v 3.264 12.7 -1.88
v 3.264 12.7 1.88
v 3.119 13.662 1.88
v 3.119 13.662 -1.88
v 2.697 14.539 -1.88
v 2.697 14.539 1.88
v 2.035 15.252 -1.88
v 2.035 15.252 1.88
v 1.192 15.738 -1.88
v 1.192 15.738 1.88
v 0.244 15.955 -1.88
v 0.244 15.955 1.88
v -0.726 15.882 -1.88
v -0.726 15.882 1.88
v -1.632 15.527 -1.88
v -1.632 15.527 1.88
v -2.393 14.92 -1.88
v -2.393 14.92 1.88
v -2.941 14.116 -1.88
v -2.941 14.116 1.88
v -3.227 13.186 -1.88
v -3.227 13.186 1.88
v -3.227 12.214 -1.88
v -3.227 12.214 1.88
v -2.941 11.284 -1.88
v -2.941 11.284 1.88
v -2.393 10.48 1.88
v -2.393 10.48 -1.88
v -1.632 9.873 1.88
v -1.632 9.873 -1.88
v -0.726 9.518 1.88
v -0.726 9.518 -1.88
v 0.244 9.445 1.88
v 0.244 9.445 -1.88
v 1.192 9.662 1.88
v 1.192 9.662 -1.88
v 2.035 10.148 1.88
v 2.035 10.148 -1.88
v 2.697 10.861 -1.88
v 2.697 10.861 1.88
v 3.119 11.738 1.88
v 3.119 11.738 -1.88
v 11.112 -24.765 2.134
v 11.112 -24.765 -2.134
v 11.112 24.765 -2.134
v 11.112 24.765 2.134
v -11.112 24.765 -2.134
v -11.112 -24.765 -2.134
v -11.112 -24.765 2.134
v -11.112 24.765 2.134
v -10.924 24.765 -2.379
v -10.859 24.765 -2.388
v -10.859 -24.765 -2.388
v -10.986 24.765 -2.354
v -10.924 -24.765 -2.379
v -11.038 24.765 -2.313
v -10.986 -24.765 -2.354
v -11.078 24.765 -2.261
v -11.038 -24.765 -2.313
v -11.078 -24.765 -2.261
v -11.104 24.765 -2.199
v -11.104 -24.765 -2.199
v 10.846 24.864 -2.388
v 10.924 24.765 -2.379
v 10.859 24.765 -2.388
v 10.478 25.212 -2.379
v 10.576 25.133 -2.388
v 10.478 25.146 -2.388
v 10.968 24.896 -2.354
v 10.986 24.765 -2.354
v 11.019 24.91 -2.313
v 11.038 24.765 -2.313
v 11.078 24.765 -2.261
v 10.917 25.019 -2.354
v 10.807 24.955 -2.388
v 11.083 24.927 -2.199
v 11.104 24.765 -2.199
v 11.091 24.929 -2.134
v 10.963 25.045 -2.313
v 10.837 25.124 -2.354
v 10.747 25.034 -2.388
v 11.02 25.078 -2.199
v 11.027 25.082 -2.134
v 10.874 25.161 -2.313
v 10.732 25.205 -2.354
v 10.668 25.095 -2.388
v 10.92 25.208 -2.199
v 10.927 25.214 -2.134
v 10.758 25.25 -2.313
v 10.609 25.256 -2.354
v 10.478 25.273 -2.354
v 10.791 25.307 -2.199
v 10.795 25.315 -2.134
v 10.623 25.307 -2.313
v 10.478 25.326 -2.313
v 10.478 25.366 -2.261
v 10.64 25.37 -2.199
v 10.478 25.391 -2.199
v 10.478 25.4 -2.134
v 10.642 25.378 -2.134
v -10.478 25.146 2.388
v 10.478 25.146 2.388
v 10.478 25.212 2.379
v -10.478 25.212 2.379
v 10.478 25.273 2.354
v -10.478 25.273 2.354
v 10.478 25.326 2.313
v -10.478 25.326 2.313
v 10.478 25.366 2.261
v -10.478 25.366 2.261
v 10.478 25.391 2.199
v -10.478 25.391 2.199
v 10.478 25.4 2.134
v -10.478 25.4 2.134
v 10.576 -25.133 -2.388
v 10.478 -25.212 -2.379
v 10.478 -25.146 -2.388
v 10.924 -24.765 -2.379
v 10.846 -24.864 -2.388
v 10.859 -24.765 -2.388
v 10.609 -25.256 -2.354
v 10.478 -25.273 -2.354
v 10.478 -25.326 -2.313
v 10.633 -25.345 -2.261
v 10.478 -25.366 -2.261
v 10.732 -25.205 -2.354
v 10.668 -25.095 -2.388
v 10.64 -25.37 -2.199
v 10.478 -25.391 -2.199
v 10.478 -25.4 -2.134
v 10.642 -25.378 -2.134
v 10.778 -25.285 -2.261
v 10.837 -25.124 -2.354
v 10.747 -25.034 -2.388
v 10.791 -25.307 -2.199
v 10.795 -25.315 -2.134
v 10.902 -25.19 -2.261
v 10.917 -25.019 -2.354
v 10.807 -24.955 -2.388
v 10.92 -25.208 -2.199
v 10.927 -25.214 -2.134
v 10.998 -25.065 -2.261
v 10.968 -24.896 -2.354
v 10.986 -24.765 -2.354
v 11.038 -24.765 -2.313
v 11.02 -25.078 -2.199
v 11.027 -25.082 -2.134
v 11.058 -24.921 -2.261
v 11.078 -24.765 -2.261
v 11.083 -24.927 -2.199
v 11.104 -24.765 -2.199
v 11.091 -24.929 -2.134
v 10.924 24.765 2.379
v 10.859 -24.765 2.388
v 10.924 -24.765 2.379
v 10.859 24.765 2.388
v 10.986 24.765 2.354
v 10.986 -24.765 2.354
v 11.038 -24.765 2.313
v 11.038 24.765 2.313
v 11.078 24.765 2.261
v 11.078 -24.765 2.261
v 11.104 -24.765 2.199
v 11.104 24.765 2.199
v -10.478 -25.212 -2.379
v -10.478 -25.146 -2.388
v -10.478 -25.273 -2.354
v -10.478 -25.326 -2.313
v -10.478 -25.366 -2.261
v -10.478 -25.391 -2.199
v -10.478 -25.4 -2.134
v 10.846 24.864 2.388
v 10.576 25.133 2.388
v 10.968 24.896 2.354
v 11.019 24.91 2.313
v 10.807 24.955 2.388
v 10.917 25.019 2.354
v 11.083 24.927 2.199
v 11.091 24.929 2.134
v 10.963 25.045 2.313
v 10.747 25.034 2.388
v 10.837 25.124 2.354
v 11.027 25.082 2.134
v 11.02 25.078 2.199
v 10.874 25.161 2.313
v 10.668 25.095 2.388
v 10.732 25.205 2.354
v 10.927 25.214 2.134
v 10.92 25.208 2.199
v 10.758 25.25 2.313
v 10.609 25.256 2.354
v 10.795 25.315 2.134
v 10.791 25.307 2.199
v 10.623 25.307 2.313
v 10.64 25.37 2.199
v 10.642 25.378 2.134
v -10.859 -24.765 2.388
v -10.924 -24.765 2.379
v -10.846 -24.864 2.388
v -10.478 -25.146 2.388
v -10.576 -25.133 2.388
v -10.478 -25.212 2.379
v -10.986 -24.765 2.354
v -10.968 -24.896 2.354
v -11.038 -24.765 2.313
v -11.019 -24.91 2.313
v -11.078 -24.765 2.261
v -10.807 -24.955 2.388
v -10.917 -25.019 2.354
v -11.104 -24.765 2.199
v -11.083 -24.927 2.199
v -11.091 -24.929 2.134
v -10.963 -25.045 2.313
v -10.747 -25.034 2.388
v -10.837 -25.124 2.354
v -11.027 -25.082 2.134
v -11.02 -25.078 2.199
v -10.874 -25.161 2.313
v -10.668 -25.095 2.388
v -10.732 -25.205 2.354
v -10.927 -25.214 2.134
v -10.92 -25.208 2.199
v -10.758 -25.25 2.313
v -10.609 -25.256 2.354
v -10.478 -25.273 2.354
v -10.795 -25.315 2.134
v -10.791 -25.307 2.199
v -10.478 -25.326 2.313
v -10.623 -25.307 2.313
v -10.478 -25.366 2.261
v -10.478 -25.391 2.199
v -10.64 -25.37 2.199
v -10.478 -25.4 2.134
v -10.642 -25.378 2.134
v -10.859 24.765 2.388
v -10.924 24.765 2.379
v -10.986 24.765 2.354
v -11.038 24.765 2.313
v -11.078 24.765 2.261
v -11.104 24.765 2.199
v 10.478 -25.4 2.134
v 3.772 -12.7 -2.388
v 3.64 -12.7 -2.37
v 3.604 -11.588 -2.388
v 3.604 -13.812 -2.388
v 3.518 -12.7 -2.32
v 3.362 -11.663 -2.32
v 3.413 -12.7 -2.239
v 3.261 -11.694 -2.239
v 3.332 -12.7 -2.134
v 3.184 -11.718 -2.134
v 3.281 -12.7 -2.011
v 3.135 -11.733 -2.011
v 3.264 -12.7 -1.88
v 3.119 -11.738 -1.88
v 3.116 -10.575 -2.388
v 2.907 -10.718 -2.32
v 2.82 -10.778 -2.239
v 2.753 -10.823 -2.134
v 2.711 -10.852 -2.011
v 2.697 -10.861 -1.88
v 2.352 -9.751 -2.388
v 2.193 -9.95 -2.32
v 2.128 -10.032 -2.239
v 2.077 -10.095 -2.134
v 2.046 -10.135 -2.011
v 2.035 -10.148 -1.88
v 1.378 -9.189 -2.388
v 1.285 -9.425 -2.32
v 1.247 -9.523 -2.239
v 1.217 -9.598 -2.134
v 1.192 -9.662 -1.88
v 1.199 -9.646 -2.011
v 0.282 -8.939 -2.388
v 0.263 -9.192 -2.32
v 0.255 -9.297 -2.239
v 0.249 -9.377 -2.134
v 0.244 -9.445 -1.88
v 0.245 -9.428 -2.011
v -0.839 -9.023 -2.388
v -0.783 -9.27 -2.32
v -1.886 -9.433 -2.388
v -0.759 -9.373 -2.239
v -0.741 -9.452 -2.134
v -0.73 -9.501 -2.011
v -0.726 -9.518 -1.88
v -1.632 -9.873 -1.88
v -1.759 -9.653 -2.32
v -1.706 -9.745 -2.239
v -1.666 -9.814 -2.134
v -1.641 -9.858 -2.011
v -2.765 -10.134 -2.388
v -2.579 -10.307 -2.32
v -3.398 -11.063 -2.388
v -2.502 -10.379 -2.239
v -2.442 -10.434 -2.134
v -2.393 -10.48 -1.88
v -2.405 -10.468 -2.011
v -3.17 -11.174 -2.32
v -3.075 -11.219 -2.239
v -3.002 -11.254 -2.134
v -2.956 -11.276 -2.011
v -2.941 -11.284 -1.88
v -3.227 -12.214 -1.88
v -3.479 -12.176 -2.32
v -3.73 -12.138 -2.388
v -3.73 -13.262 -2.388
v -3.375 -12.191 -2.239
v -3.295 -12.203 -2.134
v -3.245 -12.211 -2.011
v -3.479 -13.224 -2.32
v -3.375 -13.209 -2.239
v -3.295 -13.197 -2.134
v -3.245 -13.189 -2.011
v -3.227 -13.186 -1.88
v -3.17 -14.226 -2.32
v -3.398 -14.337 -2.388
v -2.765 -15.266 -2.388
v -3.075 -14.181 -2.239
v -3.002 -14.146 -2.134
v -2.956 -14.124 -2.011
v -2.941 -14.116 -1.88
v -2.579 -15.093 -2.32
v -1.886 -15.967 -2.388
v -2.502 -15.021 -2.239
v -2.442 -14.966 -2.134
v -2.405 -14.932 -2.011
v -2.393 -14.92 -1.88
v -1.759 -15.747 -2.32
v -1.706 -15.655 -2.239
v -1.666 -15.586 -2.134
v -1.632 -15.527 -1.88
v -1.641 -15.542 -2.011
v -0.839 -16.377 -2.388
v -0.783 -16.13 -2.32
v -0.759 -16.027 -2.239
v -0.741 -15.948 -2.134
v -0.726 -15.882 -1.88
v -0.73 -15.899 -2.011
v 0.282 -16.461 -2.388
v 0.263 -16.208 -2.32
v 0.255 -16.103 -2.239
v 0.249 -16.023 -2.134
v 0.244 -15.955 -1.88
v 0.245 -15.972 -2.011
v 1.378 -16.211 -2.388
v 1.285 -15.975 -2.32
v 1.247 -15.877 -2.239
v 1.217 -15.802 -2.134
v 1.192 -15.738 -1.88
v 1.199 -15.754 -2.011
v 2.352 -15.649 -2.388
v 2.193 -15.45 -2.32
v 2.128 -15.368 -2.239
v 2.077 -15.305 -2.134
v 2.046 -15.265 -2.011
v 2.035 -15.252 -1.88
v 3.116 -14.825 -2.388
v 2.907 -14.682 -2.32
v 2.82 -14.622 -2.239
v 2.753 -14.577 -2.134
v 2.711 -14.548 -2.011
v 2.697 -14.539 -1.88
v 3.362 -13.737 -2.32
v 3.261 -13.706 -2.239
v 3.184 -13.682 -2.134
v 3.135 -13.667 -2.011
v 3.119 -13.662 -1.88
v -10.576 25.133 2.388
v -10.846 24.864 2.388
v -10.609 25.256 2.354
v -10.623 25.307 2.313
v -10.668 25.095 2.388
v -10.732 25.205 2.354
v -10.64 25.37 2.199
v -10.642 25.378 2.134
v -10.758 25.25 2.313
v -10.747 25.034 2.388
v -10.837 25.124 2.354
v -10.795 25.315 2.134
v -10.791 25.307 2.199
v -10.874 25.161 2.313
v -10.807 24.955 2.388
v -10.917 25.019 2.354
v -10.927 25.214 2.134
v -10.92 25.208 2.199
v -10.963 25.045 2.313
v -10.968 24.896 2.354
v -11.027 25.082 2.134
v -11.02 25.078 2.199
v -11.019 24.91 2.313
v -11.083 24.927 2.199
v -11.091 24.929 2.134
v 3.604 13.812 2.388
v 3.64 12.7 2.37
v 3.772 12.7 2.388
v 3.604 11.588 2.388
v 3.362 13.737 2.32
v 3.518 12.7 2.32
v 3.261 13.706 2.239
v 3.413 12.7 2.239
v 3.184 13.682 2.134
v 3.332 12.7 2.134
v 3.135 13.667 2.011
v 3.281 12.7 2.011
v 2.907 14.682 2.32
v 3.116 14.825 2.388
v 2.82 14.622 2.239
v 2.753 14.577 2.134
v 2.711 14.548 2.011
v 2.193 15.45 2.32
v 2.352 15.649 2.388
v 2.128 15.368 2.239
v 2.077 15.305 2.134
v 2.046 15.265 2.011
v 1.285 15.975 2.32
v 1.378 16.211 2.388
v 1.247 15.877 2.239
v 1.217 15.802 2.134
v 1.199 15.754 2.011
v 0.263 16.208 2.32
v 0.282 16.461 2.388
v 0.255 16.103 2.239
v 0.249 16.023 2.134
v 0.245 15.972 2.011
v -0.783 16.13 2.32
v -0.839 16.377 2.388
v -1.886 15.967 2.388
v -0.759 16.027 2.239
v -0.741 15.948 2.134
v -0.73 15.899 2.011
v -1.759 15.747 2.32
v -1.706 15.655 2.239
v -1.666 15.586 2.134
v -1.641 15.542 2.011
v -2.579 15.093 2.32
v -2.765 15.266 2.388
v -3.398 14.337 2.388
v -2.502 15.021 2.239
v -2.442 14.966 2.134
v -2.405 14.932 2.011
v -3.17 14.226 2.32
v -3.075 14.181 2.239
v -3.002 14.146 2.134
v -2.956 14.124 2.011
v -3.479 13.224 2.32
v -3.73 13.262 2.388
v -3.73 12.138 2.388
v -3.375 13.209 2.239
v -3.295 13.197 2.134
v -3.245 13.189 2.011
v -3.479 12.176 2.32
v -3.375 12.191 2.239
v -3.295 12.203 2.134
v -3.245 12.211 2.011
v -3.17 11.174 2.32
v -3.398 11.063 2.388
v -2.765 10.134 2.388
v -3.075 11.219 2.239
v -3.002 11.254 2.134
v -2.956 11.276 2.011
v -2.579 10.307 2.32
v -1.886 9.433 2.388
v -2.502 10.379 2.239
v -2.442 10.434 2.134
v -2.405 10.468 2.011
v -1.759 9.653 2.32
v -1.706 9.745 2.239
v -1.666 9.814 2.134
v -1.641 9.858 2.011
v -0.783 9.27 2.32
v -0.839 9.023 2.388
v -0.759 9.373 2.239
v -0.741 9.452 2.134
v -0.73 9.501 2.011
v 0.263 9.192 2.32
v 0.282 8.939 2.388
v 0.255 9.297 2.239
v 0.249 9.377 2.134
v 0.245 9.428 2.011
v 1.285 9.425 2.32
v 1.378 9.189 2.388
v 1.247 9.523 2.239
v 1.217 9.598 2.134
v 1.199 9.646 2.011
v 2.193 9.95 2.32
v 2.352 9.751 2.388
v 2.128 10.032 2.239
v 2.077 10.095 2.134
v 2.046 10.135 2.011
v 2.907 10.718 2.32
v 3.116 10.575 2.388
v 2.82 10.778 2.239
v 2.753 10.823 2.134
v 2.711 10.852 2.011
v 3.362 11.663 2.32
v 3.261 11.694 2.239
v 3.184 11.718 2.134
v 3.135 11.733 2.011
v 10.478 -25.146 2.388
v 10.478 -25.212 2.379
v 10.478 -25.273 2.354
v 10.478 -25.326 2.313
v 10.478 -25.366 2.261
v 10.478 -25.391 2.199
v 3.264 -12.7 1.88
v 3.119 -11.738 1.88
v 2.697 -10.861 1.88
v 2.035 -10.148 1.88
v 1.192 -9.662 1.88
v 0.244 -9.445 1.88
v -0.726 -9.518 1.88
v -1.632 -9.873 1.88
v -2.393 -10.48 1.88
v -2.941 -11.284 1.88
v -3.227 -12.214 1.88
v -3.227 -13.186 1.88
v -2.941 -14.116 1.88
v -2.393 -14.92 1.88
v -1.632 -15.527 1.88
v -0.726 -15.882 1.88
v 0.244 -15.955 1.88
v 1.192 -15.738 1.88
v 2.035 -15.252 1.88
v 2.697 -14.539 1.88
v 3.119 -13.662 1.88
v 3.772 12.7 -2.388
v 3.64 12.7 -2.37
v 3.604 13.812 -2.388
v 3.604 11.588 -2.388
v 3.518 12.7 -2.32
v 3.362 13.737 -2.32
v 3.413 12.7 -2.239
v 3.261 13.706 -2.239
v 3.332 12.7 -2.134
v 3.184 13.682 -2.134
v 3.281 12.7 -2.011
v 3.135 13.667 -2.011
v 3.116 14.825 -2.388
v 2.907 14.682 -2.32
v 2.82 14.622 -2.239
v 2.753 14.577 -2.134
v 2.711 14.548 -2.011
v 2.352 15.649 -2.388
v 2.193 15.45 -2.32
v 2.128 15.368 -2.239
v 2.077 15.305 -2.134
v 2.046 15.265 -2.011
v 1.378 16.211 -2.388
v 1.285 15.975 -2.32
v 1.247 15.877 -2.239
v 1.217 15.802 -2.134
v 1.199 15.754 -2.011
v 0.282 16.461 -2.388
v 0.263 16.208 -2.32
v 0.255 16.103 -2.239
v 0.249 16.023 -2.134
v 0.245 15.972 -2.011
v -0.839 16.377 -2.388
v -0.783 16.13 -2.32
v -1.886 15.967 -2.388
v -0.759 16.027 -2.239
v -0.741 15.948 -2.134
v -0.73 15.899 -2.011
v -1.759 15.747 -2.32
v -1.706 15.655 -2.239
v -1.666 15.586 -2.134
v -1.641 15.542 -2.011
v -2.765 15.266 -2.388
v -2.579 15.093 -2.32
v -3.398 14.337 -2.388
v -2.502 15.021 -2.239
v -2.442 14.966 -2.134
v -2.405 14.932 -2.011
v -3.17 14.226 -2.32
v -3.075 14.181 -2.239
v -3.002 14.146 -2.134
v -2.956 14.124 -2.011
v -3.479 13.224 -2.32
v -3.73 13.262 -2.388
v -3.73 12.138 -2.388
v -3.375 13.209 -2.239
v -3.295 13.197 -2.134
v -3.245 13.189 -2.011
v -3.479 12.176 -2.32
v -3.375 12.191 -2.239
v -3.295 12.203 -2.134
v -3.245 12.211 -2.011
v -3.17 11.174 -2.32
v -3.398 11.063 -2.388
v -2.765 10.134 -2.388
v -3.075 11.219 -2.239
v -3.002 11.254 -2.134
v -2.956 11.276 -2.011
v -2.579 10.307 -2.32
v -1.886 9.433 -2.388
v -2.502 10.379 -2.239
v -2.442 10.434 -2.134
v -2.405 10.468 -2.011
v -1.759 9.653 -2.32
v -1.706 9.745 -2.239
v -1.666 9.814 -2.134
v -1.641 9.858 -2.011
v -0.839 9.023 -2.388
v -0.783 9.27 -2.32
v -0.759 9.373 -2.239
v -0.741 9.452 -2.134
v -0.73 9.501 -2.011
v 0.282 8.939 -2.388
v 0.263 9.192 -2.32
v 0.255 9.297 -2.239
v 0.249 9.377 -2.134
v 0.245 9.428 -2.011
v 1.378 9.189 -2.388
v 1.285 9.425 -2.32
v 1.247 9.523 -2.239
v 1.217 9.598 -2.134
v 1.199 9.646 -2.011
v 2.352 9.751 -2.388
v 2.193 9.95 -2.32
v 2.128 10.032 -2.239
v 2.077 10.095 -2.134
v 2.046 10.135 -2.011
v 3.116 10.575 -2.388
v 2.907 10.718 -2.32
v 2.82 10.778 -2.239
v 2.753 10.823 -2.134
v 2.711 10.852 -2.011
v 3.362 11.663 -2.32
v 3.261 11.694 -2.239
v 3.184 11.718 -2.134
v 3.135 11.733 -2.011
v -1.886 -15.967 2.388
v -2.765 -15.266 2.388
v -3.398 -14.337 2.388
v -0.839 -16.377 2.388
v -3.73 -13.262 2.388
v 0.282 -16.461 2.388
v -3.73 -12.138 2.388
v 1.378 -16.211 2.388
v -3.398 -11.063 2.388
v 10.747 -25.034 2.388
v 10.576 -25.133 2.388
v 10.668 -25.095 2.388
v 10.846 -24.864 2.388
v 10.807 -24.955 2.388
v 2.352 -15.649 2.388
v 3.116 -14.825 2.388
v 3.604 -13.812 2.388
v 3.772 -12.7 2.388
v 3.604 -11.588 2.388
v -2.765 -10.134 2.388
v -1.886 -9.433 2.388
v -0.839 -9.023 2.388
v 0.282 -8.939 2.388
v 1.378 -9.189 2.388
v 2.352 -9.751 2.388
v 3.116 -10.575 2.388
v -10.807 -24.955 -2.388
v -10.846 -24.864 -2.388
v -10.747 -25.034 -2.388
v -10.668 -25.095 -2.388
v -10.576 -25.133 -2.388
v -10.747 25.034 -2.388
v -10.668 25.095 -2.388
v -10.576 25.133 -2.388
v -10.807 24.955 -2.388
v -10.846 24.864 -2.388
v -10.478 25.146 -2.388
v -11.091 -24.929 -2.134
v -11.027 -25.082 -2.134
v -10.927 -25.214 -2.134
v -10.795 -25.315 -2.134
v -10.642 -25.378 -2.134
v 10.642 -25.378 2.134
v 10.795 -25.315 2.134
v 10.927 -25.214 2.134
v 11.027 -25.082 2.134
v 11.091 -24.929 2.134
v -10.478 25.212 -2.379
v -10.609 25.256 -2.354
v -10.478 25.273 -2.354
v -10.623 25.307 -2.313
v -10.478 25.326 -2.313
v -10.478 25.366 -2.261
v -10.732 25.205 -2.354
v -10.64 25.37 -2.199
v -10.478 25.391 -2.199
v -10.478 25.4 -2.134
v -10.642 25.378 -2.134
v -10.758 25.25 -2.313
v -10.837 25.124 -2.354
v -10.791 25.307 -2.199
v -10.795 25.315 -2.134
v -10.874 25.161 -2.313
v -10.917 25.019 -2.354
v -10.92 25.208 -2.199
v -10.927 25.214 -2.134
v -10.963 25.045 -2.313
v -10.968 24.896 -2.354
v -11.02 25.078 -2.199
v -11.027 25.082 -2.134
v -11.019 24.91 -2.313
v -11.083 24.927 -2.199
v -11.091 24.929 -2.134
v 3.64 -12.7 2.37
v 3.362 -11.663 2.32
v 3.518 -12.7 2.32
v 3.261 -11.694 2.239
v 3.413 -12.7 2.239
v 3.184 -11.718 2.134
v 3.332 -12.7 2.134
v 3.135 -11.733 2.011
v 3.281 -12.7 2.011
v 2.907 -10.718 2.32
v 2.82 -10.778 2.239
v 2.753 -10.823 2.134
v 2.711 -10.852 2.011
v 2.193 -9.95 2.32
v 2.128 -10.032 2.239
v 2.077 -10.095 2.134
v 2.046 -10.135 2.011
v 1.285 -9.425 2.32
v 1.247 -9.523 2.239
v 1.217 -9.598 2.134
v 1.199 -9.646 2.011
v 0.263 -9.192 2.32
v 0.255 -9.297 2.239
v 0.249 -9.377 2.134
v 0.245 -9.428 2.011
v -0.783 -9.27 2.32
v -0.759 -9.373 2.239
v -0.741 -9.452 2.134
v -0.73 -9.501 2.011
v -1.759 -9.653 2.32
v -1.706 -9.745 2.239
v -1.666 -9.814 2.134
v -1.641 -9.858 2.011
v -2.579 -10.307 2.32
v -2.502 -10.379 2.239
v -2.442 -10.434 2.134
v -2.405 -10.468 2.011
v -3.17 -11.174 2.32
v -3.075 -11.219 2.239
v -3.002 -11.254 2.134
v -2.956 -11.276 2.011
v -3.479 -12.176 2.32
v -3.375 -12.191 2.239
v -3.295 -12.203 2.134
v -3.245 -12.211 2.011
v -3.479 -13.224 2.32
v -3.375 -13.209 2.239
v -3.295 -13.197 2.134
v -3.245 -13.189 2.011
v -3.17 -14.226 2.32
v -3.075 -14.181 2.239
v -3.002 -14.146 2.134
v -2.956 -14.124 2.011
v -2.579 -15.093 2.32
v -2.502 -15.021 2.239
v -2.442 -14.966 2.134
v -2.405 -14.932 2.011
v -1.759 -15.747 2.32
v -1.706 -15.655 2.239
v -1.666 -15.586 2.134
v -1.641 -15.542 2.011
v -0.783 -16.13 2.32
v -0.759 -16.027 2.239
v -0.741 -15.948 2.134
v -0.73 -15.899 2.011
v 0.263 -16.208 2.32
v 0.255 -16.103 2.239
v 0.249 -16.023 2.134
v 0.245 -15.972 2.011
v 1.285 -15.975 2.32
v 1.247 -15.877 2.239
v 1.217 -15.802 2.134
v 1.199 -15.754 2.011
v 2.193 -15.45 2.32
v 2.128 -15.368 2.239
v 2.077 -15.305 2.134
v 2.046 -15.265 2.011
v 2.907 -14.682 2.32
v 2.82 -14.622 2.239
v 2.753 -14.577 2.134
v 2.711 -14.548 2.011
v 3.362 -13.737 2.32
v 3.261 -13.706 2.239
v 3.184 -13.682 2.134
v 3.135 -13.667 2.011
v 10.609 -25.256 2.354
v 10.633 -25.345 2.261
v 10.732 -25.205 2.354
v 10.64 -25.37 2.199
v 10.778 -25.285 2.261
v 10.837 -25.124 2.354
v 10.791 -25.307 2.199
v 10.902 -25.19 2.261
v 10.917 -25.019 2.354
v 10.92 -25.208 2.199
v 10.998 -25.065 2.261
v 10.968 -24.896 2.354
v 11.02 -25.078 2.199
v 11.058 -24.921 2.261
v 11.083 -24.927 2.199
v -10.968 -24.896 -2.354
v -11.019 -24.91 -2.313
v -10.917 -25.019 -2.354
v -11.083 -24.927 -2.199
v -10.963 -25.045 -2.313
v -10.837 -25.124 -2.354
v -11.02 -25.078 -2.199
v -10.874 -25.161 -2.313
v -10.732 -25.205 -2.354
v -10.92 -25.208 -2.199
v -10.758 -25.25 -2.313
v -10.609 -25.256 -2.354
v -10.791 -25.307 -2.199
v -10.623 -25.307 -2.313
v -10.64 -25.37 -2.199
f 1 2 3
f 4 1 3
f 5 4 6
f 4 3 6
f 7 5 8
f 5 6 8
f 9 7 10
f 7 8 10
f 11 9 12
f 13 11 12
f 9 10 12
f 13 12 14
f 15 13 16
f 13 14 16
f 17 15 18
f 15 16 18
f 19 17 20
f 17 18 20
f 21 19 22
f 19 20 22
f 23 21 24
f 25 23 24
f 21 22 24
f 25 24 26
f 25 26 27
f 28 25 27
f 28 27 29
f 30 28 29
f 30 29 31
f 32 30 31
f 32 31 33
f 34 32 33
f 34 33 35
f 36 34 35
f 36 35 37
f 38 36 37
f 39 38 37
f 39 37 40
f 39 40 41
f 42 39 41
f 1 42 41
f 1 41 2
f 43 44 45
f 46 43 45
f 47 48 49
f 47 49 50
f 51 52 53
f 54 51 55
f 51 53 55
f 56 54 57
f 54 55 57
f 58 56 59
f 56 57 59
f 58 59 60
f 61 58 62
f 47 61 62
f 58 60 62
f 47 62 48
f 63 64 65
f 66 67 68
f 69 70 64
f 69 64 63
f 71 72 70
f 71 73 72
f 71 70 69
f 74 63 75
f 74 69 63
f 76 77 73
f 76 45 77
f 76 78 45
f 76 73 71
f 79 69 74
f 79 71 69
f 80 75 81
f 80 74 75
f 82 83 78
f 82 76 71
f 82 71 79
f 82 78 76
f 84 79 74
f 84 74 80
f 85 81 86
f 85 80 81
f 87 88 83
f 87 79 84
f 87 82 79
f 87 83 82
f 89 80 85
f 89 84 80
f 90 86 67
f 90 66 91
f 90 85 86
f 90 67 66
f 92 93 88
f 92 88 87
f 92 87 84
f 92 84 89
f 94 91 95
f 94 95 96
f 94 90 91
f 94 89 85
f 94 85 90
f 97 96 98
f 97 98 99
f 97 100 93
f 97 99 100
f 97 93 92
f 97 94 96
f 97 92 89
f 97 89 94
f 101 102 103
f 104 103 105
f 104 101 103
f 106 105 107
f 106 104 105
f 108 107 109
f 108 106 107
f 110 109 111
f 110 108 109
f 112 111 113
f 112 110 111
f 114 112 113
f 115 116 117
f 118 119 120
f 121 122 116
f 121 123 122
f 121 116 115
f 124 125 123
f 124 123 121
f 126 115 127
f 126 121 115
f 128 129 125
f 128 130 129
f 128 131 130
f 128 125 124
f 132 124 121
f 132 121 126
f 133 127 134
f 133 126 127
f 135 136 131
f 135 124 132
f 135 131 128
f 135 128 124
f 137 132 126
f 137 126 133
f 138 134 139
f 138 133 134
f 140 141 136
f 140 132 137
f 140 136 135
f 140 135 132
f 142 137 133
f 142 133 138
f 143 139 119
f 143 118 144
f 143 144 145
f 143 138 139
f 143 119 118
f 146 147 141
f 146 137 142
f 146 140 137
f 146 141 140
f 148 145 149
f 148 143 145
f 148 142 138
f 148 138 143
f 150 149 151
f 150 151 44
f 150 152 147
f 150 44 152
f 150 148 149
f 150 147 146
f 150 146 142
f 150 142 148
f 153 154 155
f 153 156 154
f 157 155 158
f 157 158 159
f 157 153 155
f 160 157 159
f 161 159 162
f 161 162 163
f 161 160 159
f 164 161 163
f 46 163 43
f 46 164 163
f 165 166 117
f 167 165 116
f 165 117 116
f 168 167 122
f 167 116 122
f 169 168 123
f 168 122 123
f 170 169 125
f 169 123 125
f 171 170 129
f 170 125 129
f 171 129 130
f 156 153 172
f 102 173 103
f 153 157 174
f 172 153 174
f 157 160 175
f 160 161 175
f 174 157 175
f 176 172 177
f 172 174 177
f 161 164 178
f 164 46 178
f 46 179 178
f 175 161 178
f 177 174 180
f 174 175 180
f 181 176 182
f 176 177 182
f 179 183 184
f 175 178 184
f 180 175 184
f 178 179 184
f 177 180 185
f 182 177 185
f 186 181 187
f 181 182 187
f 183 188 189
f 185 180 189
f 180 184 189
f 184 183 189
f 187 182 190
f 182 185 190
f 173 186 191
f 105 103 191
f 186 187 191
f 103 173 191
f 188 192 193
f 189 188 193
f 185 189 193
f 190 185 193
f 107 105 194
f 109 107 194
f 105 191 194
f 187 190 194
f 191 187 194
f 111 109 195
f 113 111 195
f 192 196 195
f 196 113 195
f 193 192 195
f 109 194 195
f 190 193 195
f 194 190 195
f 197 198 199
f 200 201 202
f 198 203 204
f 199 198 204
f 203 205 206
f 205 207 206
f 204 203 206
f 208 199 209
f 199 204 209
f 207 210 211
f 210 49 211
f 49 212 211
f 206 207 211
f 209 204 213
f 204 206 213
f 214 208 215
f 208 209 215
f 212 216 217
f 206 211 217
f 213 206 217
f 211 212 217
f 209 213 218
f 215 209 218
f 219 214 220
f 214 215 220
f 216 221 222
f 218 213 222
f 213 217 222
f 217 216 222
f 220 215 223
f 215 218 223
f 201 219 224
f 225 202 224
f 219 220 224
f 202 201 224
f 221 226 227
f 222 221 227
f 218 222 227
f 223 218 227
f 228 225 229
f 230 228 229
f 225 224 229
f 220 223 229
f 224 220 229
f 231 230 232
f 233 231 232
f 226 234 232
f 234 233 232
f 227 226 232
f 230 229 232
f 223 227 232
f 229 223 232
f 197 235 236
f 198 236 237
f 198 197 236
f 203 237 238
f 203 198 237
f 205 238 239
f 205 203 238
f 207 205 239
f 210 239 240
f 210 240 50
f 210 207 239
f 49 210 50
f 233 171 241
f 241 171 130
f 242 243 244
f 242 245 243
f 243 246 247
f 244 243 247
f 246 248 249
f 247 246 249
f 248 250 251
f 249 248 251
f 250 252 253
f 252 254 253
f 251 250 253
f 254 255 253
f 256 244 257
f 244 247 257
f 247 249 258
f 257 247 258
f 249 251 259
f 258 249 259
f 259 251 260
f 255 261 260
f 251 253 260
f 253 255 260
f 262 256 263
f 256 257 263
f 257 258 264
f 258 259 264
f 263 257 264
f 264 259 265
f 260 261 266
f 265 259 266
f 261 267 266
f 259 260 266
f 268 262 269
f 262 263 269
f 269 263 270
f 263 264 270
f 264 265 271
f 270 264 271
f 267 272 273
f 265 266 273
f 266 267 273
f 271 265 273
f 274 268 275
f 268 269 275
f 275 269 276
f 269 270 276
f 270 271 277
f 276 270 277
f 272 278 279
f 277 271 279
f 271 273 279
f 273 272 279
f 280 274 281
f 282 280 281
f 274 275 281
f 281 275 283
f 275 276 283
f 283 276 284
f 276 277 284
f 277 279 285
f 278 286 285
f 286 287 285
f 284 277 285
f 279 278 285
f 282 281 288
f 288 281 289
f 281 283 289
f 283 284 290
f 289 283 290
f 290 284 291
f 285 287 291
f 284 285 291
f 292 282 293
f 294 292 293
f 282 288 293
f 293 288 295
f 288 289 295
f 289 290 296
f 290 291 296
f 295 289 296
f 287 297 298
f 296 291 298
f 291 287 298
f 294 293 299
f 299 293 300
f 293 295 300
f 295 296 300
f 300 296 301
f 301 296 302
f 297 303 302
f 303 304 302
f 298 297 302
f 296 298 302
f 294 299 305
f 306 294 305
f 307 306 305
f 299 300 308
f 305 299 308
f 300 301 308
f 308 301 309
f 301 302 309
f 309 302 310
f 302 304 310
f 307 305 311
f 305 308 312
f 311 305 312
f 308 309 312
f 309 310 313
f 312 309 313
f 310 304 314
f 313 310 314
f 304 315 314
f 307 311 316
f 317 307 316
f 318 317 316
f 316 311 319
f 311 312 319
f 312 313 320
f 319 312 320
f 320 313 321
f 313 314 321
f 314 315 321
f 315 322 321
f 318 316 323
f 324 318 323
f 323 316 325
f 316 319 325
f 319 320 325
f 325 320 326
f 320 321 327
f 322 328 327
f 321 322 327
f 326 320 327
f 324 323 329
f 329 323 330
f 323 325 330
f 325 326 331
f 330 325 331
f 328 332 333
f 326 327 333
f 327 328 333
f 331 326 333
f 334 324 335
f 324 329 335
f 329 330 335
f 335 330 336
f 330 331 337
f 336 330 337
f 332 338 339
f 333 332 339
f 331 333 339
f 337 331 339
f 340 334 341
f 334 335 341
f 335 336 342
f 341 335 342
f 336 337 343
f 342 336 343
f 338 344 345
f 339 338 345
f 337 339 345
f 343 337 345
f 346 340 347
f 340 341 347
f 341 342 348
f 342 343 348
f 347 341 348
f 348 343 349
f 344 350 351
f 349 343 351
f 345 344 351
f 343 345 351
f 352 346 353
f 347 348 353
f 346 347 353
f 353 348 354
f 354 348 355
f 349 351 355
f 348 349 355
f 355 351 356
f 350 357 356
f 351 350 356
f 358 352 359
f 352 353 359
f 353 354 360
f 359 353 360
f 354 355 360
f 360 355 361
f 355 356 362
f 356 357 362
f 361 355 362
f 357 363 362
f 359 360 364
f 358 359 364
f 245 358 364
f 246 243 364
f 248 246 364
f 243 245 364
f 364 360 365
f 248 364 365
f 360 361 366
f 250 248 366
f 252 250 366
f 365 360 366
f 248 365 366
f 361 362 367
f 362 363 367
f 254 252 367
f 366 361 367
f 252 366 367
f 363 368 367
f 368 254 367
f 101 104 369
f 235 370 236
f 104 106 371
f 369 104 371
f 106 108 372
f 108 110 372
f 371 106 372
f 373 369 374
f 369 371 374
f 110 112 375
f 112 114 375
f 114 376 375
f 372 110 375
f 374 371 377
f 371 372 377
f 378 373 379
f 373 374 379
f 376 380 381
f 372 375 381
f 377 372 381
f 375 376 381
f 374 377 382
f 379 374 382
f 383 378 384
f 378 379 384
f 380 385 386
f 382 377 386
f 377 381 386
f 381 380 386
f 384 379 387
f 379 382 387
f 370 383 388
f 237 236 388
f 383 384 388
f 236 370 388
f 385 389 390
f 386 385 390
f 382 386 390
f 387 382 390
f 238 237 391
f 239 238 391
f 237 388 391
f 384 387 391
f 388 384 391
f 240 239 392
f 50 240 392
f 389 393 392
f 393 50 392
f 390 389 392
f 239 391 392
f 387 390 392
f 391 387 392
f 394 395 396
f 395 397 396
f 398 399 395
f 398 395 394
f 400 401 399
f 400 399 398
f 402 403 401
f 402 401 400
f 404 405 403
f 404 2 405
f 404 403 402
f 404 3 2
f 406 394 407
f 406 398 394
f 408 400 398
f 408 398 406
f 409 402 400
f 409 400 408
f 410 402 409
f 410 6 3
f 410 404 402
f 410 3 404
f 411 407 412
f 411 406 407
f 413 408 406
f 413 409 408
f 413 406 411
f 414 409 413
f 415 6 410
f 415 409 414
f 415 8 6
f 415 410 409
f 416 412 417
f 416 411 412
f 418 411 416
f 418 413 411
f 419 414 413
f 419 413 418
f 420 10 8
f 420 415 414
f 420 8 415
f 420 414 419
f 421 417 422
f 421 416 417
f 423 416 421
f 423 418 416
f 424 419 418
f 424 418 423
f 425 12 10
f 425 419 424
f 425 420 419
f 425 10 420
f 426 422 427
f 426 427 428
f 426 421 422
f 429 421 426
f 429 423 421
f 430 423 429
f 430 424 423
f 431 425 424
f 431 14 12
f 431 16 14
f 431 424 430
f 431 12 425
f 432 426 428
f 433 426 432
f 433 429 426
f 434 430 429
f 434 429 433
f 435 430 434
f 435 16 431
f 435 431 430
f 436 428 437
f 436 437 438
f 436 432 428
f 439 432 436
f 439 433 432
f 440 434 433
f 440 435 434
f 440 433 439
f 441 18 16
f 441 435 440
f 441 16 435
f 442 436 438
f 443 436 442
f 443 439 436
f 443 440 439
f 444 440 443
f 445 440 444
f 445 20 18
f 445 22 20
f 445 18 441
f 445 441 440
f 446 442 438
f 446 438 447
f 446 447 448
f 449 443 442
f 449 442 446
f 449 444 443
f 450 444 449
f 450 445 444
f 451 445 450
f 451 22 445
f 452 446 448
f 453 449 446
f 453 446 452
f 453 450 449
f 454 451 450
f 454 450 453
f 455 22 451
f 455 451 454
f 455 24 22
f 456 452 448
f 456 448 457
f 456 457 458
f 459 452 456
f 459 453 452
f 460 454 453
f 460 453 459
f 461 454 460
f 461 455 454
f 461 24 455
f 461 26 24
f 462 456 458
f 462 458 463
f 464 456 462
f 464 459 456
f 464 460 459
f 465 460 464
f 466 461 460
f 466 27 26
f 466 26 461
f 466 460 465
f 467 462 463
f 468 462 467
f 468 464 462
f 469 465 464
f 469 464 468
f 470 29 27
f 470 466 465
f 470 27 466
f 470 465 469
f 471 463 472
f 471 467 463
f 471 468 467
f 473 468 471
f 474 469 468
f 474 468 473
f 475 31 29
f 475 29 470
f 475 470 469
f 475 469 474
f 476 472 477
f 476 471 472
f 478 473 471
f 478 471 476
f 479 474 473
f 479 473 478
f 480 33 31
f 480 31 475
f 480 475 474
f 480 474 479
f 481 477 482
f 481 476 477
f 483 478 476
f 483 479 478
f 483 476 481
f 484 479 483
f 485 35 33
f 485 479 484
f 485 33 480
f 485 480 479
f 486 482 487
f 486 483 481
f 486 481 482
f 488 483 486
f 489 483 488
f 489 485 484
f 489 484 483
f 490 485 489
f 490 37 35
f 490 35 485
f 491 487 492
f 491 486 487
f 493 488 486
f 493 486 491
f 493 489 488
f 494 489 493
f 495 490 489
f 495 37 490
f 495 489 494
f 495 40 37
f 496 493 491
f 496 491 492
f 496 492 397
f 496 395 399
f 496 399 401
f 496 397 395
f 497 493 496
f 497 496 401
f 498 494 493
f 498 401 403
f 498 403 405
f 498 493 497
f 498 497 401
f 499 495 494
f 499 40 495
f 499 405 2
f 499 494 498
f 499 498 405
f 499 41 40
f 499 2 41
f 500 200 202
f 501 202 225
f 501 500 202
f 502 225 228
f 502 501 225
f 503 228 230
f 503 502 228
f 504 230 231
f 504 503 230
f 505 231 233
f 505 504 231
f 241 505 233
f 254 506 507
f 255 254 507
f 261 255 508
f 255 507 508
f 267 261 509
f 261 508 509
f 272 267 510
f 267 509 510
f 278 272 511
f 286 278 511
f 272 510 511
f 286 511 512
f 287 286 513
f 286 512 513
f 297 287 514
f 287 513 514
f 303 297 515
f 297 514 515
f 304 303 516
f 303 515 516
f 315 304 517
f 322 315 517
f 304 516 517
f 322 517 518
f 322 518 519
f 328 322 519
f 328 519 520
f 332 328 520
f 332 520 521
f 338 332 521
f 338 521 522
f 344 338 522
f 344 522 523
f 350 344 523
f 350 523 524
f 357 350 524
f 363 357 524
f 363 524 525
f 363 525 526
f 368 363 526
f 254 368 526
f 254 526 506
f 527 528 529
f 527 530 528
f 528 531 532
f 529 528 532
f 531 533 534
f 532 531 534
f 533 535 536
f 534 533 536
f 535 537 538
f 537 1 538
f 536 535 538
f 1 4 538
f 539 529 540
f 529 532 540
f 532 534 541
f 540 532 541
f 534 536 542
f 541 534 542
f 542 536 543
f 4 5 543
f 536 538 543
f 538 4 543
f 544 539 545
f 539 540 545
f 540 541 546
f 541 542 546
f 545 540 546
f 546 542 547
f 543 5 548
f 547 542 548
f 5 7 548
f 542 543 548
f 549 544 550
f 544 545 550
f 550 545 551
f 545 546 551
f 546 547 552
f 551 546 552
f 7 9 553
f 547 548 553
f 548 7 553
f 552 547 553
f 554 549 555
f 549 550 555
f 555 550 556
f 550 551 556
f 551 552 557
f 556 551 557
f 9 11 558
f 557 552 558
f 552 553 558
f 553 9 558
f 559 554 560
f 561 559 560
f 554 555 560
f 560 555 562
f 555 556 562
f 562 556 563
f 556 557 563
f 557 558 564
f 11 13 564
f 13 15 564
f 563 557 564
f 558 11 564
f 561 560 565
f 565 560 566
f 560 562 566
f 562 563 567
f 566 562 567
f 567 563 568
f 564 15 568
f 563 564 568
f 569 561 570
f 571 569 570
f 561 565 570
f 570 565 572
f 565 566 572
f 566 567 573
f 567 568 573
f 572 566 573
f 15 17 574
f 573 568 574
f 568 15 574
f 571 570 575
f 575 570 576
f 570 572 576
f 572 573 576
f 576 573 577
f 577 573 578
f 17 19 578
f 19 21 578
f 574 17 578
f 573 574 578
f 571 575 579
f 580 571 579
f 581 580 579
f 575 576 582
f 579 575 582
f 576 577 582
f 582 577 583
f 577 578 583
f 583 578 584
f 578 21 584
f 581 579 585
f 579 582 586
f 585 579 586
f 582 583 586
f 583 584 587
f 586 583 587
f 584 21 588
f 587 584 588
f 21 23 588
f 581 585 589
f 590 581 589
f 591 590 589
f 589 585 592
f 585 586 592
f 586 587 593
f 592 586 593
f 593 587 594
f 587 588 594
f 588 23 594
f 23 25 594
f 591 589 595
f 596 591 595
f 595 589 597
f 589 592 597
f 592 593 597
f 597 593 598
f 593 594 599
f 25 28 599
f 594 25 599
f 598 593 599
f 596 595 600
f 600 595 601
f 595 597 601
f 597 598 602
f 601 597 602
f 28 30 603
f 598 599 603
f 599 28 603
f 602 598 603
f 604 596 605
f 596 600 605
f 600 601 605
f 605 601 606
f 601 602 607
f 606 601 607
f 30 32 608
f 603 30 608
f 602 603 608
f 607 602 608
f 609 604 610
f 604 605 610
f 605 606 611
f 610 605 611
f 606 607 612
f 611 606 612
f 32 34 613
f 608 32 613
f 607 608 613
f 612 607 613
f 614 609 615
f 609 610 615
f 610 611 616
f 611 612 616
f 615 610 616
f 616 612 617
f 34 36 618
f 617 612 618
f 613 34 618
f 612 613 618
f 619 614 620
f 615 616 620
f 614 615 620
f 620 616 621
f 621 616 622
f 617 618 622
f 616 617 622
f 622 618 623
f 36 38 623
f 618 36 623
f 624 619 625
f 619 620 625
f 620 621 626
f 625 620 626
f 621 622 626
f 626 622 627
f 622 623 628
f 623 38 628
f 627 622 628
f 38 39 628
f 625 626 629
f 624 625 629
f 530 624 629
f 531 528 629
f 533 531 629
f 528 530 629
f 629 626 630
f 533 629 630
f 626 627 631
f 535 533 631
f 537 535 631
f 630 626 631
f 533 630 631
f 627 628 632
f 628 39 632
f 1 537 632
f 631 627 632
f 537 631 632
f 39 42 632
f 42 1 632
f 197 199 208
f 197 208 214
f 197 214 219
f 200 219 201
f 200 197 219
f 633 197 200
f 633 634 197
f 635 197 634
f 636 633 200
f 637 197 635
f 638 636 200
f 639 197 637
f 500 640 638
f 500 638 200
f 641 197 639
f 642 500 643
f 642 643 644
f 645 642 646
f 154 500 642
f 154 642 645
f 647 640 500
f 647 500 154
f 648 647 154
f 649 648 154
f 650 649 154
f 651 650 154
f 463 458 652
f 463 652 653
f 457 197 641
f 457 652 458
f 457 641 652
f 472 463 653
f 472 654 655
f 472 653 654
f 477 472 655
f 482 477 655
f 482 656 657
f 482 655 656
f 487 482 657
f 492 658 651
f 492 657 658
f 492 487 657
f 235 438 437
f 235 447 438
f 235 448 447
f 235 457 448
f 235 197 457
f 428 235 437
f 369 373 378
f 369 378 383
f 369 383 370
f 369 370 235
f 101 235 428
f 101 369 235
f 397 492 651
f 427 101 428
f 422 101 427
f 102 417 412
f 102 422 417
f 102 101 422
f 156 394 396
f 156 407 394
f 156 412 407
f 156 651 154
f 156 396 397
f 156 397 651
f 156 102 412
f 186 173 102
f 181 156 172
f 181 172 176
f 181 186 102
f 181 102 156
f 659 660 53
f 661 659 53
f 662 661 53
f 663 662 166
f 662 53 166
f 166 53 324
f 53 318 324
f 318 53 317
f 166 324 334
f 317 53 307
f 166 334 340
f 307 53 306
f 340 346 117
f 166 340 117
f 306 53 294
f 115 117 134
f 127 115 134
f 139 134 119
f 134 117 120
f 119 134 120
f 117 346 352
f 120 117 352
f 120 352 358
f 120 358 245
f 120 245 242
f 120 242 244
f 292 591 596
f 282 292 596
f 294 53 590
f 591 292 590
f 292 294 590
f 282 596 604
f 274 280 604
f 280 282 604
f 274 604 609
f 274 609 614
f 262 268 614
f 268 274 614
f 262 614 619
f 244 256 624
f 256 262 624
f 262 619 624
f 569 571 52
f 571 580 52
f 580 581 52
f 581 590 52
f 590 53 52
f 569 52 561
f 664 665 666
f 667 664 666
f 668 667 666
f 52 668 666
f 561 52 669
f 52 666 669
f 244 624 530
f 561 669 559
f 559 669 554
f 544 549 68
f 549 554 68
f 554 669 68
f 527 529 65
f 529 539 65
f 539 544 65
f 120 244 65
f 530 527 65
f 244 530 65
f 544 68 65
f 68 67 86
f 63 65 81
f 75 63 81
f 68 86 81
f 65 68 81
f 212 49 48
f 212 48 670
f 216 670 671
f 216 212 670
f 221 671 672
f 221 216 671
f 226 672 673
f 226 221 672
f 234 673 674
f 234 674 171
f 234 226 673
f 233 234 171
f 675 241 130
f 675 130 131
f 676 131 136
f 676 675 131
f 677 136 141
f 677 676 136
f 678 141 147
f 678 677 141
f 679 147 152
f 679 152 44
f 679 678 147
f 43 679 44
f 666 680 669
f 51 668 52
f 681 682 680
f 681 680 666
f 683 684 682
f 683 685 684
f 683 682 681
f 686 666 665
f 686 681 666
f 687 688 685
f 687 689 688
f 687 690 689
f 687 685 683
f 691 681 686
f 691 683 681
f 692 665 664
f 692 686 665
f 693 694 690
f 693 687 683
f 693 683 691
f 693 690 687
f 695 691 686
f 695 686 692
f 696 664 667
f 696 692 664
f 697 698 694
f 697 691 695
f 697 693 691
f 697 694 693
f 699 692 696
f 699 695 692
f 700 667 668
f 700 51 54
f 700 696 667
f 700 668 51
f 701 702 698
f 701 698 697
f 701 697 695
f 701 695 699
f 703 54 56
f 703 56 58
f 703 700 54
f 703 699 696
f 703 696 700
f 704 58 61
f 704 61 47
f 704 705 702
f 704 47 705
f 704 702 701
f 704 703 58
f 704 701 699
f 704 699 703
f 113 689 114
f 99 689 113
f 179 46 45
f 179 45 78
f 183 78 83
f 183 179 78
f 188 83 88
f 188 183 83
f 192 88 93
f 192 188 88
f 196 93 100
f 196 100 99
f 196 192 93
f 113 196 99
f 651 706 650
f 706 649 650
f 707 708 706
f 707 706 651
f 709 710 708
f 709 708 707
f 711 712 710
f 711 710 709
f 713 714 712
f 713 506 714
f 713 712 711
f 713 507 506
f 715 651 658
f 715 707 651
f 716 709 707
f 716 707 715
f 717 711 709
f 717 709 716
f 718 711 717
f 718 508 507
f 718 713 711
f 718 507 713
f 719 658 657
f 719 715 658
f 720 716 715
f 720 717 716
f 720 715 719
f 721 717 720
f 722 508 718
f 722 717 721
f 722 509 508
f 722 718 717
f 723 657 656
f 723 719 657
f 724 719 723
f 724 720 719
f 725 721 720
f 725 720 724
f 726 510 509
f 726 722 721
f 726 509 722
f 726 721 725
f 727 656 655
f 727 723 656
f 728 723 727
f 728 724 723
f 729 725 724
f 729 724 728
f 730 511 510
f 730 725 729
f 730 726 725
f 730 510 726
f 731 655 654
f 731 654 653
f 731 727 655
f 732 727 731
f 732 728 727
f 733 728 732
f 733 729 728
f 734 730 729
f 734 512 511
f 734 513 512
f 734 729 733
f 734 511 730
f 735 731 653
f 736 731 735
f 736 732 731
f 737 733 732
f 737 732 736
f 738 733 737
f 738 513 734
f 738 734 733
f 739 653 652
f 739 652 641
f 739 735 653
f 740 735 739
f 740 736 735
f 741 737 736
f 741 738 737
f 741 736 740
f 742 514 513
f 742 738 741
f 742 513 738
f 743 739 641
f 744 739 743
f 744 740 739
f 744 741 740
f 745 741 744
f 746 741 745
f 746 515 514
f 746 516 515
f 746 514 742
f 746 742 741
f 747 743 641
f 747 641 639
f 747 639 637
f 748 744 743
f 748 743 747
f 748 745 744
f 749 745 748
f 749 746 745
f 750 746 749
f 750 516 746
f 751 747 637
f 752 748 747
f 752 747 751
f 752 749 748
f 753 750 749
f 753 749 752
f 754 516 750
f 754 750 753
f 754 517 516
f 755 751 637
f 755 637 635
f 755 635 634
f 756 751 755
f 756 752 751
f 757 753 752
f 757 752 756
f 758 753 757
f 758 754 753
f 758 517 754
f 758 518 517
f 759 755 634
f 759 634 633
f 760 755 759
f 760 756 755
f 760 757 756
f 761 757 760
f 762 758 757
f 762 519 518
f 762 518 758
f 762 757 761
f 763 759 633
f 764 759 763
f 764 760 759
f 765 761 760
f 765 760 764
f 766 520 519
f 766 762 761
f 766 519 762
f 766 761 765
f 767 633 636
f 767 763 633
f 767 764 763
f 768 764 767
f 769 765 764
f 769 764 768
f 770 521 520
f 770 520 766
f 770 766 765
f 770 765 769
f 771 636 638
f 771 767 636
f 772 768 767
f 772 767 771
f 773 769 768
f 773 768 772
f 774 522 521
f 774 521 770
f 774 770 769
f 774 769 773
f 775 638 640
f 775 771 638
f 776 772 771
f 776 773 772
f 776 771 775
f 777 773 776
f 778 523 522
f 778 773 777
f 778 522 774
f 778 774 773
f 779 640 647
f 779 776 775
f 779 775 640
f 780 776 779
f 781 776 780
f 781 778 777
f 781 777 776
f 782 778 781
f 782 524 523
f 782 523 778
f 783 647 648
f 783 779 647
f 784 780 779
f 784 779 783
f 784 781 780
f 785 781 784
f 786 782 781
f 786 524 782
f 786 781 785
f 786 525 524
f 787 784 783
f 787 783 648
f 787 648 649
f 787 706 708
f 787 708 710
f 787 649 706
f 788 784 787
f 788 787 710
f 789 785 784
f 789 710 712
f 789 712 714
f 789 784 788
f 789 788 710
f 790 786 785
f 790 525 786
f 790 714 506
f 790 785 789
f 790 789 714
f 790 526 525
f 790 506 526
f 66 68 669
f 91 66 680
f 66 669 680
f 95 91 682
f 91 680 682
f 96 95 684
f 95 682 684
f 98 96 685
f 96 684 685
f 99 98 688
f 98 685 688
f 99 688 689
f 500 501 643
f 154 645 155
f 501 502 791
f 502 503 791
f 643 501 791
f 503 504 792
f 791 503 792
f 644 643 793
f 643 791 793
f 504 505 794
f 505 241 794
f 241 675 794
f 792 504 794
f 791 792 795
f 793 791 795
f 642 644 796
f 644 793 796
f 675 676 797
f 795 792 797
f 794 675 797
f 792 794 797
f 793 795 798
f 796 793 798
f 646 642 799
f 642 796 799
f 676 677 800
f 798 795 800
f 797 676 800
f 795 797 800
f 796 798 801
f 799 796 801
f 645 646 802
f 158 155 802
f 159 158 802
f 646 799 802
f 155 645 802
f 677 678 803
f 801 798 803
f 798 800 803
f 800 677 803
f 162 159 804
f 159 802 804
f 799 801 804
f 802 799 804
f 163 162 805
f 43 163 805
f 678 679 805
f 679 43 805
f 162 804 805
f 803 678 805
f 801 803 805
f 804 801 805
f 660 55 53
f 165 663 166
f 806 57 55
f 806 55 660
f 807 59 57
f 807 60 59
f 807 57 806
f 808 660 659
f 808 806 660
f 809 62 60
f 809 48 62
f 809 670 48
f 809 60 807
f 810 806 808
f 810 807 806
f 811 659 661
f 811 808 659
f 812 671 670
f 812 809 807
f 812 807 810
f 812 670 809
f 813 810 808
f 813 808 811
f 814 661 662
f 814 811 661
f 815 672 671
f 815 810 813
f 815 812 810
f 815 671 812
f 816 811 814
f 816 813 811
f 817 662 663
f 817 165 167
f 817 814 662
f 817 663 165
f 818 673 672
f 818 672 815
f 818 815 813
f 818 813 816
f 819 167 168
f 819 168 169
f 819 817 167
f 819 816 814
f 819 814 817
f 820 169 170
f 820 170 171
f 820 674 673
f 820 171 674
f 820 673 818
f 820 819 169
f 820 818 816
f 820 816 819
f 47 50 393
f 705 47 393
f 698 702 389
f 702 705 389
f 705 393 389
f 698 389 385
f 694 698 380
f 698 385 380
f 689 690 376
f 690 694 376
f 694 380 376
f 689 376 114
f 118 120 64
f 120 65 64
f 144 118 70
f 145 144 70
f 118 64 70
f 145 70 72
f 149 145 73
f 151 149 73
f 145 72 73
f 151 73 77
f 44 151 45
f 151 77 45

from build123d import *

# Parameters (mm, degrees)
BOSS_EXTRUDE1_START  = -2.3876
SKETCH3_W            = 22.225
SKETCH3_H            = 50.8
BOSS_EXTRUDE1_DEPTH  = 4.7752
FILLET1_R            = 0.635
SKETCH4_R            = 3.2639
CUT_EXTRUDE1_DEPTH   = 29.132724562
LPATTERN1_COUNT      = 2
LPATTERN1_PITCH      = 25.4
LPATTERN1_COUNT_DIR2 = 2
LPATTERN1_PITCH_DIR2 = 25.4
FILLET2_R            = 0.254
FILLET3_R            = 0.508


with BuildPart() as part:
    # Sketch3 → Boss-Extrude1 (new body)
    with BuildSketch(Plane.XY.offset(BOSS_EXTRUDE1_START)):
        Rectangle(SKETCH3_W, SKETCH3_H)
    extrude(amount=BOSS_EXTRUDE1_DEPTH)

    # Fillet1
    fillet1_edges = [part.edges().sort_by_distance(p)[0] for p in [
        (11.1125, 25.4, 0),
        (11.1125, -25.4, 0),
        (-11.1125, -25.4, 0),
        (-11.1125, 25.4, 0),
    ]]
    fillet(fillet1_edges, radius=FILLET1_R)

    # Sketch4 → Cut-Extrude1 (cut, through all)
    with BuildSketch(Plane.XY.offset(2.3876)):
        with Locations((0, 12.7)):
            Circle(SKETCH4_R)
    cut_extrude1 = extrude(amount=-CUT_EXTRUDE1_DEPTH, mode=Mode.SUBTRACT)

    # LPattern1: Cut-Extrude1 2 × 2
    with Locations(*[(-j * LPATTERN1_PITCH_DIR2, -i * LPATTERN1_PITCH, 0) for i in range(LPATTERN1_COUNT) for j in range(LPATTERN1_COUNT_DIR2) if (i, j) != (0, 0)]):
        add(cut_extrude1, mode=Mode.SUBTRACT)

    # Fillet2
    fillet2_edges = [part.edges().sort_by_distance(p)[0] for p in [
        (11.1125, 0, -2.3876),
        (11.1125, 0, 2.3876),
        (0, 25.4, -2.3876),
        (0, -25.4, -2.3876),
        (-11.1125, 0, -2.3876),
        (10.926512806, 25.214012806, -2.3876),
        (-10.926512806, 25.214012806, -2.3876),
        (-10.926512806, -25.214012806, -2.3876),
        (10.926512806, -25.214012806, -2.3876),
        (0, -25.4, 2.3876),
        (0, 25.4, 2.3876),
        (-11.1125, 0, 2.3876),
        (10.926512806, 25.214012806, 2.3876),
        (-10.926512806, 25.214012806, 2.3876),
        (-10.926512806, -25.214012806, 2.3876),
        (10.926512806, -25.214012806, 2.3876),
    ]]
    fillet(fillet2_edges, radius=FILLET2_R)

    # Fillet3
    fillet3_edges = [part.edges().sort_by_distance(p)[0] for p in [
        (-3.2639, 12.7, -2.3876),
        (-3.2639, 12.7, 2.3876),
        (-3.2639, -12.7, -2.3876),
        (-3.2639, -12.7, 2.3876),
    ]]
    fillet(fillet3_edges, radius=FILLET3_R)


solid = part.part
